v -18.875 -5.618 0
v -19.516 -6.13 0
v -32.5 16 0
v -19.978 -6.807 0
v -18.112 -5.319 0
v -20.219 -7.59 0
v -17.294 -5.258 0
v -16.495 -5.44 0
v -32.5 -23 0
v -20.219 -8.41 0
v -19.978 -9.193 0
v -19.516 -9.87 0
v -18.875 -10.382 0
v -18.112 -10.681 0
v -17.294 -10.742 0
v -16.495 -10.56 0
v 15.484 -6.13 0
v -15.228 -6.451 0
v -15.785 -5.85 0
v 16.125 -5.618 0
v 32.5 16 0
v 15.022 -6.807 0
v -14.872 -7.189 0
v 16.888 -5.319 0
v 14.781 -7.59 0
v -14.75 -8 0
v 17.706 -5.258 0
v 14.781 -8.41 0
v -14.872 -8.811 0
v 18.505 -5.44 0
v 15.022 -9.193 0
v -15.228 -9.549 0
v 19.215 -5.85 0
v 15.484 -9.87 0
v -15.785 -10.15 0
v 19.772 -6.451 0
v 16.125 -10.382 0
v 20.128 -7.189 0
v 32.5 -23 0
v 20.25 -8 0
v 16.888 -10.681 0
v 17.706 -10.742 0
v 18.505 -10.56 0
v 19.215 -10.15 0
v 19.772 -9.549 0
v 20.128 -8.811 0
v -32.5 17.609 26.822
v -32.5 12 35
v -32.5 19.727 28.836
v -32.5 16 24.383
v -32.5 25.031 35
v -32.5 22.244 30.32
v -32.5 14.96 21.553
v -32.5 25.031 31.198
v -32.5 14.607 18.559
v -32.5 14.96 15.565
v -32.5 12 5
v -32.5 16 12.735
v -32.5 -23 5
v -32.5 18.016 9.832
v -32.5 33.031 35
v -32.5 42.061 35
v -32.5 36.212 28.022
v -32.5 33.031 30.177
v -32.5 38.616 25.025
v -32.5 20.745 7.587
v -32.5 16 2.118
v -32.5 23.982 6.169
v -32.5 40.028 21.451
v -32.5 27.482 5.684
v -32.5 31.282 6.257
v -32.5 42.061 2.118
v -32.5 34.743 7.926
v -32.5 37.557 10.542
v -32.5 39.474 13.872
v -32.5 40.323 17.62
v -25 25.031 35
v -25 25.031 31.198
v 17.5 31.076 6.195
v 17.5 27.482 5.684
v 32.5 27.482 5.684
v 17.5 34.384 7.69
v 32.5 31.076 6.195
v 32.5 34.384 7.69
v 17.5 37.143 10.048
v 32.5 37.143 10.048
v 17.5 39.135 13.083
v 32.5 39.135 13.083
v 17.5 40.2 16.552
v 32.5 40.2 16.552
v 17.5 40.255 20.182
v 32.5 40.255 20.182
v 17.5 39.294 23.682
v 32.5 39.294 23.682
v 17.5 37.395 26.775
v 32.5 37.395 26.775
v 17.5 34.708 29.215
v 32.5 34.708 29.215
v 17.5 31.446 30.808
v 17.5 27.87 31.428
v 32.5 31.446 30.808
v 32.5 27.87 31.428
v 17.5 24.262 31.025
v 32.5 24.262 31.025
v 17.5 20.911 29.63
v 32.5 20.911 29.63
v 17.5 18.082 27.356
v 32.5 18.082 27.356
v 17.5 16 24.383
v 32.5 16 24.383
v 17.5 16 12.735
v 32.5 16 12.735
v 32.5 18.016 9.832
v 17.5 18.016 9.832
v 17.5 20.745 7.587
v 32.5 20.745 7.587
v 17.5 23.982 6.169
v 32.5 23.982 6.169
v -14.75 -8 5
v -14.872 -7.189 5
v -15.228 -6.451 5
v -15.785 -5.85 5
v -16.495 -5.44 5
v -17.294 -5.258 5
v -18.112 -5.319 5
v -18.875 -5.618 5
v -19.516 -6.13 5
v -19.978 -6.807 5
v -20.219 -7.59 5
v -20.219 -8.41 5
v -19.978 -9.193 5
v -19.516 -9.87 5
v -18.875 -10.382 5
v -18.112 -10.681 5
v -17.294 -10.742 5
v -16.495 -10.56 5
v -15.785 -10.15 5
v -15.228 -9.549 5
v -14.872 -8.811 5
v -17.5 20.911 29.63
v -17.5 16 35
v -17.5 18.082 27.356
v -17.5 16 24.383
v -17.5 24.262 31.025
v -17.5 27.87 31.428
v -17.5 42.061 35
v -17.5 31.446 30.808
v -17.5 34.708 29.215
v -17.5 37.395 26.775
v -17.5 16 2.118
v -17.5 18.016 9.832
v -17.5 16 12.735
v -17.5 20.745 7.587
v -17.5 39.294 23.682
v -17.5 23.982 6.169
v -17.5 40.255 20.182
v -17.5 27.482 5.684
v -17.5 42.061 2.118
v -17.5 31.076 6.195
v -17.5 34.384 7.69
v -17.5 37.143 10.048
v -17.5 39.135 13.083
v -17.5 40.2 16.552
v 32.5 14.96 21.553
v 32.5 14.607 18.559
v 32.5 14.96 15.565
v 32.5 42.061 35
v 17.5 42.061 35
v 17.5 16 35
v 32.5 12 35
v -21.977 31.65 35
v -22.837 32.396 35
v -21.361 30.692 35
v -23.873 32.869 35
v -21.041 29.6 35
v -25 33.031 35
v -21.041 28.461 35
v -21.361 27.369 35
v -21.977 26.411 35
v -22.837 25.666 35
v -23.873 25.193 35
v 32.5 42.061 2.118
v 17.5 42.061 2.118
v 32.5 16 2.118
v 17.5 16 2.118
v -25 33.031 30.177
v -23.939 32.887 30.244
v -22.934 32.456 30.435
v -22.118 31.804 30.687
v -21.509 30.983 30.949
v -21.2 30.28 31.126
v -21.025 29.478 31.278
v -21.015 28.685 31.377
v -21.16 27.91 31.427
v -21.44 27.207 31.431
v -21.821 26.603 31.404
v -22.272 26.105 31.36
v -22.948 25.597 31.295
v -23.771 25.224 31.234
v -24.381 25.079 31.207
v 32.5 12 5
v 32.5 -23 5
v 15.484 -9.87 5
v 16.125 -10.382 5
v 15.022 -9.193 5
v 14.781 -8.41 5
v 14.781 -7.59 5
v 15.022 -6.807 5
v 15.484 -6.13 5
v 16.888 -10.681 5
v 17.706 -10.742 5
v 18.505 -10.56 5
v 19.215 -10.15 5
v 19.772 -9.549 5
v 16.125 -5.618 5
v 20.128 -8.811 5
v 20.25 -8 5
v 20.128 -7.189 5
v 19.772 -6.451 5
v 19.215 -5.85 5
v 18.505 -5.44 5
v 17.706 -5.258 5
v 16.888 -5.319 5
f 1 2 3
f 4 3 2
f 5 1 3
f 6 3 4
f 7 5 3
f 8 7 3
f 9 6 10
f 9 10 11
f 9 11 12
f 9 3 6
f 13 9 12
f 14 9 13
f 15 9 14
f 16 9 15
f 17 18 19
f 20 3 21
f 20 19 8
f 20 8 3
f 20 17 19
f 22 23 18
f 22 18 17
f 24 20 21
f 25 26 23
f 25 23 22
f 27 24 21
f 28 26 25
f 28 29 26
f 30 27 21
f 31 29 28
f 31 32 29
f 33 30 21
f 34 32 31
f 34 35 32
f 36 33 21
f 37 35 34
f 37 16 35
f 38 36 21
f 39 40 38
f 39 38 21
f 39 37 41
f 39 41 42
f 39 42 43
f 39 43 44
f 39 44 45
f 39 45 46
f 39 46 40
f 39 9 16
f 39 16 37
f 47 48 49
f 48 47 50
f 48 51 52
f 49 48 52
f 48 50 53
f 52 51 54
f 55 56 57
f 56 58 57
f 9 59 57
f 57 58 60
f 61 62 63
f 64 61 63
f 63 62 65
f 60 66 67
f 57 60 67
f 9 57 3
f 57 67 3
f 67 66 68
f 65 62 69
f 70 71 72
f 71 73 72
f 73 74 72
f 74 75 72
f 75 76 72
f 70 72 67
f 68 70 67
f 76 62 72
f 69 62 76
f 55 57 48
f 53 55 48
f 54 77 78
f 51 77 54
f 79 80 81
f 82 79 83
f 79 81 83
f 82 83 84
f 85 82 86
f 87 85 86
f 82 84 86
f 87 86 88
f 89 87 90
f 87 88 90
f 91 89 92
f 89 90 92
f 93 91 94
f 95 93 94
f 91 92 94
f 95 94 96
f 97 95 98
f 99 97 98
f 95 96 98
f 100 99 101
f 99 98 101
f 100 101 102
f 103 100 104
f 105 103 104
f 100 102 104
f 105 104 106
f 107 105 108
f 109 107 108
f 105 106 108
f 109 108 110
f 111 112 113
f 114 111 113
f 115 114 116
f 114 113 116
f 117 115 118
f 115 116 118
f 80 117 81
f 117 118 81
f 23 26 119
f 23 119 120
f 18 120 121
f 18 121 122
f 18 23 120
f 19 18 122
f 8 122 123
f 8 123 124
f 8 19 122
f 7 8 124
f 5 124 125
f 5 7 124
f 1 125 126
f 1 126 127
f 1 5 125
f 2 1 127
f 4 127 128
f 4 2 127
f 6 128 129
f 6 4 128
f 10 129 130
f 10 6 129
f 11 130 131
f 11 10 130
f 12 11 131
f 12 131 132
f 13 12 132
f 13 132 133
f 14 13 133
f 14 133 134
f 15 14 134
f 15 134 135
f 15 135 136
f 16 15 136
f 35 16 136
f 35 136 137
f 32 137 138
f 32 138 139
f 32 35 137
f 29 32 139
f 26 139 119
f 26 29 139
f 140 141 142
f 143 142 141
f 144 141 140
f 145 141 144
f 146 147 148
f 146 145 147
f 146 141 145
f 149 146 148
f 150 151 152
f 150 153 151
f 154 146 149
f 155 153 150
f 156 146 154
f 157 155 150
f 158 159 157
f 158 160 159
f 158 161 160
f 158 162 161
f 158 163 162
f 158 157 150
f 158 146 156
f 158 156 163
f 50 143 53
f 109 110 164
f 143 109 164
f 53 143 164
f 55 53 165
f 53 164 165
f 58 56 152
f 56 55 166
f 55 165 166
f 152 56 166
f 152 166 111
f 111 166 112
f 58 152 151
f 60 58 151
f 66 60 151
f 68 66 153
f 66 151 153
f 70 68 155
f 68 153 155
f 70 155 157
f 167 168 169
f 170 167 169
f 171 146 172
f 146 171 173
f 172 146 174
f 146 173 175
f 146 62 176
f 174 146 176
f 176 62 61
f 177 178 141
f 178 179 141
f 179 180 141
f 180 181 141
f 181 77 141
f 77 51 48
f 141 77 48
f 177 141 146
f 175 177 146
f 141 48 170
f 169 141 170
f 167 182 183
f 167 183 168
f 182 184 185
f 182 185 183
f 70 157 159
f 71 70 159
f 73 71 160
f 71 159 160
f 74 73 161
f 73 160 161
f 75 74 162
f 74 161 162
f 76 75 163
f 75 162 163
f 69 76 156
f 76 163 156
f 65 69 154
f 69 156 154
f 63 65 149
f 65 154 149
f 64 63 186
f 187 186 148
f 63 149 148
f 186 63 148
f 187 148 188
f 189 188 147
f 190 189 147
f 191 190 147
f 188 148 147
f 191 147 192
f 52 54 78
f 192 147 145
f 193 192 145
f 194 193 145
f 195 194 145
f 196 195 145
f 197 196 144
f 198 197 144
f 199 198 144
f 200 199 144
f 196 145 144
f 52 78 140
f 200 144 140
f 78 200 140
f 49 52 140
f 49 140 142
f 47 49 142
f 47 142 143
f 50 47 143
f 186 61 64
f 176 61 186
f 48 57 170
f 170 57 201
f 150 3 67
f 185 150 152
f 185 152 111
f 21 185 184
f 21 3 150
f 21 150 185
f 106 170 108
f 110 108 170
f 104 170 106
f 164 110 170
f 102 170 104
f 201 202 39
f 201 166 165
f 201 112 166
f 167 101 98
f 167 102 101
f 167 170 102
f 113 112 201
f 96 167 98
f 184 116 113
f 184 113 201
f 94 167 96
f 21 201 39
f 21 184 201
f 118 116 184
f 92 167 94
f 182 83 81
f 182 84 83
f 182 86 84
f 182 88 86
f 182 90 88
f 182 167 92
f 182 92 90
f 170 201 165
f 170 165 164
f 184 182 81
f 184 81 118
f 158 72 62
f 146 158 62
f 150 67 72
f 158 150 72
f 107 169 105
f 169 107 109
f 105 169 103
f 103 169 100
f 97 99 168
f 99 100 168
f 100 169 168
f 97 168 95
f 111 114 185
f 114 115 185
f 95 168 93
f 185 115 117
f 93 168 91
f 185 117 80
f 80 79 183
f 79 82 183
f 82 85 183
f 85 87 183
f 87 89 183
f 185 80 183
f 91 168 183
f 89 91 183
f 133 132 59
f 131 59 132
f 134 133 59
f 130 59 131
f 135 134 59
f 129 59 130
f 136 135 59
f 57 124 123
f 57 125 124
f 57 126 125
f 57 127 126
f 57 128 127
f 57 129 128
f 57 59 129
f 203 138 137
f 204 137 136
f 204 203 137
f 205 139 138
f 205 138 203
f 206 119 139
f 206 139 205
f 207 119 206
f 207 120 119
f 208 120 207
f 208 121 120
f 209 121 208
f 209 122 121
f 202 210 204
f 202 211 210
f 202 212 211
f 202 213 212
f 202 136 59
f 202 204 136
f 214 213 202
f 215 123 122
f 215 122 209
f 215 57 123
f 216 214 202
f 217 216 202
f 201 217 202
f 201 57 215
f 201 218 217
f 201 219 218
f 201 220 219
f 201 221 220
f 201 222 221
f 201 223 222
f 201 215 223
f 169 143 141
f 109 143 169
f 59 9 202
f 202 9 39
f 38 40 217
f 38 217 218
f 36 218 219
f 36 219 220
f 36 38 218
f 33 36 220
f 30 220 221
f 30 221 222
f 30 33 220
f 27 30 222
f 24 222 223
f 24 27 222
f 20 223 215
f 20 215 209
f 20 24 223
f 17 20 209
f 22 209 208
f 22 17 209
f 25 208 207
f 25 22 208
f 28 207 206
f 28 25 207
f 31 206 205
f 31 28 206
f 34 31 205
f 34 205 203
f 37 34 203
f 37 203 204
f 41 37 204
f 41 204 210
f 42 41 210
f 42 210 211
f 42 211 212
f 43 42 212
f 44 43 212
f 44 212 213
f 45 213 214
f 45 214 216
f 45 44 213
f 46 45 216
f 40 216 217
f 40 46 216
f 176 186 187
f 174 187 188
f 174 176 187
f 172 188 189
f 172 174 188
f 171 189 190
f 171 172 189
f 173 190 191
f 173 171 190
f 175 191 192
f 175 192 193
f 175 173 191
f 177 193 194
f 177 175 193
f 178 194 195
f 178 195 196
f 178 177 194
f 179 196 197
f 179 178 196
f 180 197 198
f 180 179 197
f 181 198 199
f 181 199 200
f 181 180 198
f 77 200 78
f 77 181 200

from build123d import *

# Parameters (mm, degrees)
CROQUIS2_W              = 65
CROQUIS2_H              = 35
CROQUIS2_R              = 2.75
SALIENTE_EXTRUIR1_DEPTH = 5
CROQUIS3_W              = 65
CROQUIS3_H              = 35
SALIENTE_EXTRUIR2_DEPTH = 4
SALIENTE_EXTRUIR3_DEPTH = 15
SALIENTE_EXTRUIR4_START = -65
SALIENTE_EXTRUIR4_DEPTH = 15
CORTAR_EXTRUIR1_DEPTH   = 85.965620518
CORTAR_EXTRUIR2_START   = -32.882450487
CORTAR_EXTRUIR2_DEPTH   = 4.823037372


# Read off the part's stored shape, not the designer's step: Cortar-Extruir2
with BuildPart() as part:
    # Croquis2 → Saliente-Extruir1 (new body)
    with BuildSketch(Plane.XY):
        with Locations((0, -5.5)):
            Rectangle(CROQUIS2_W, CROQUIS2_H)
        with Locations((17.5, -8)):
            Circle(CROQUIS2_R, mode=Mode.SUBTRACT)
        with Locations((-17.5, -8)):
            Circle(CROQUIS2_R, mode=Mode.SUBTRACT)
    extrude(amount=SALIENTE_EXTRUIR1_DEPTH)

    # Croquis3 → Saliente-Extruir2 (add)
    with BuildSketch(Plane(origin=(0, 12, 0), x_dir=(1, 0, 0), z_dir=(0, 1, 0))):
        with Locations((0, -17.5)):
            Rectangle(CROQUIS3_W, CROQUIS3_H)
    extrude(amount=SALIENTE_EXTRUIR2_DEPTH)

    # Croquis4 → Saliente-Extruir3 (add)
    with BuildSketch(Plane(origin=(32.5, 0, 0), x_dir=(0, 0, -1), z_dir=(1, 0, 0))):
        with BuildLine():
            Line((-35, 42.06134413), (-35, 16))
            Line((-35, 16), (-24.382874813, 16))
            ThreePointArc((-24.382874813, 16), (-25.295997358, 38.453973796), (-5.683774756, 27.482398858))
            ThreePointArc((-5.683774756, 27.482398858), (-7.587199819, 20.745176256), (-12.7346747, 16))
            Line((-12.7346747, 16), (-2.117549513, 16))
            Line((-2.117549513, 16), (-2.117549513, 42.06134413))
            Line((-2.117549513, 42.06134413), (-35, 42.06134413))
        make_face()
        with BuildLine():
            Line((-12.7346747, 16), (-24.382874813, 16))
            ThreePointArc((-24.382874813, 16), (-18.558774756, 14.607398858), (-12.7346747, 16))
        make_face()
        with BuildLine():
            ThreePointArc((-5.683774756, 27.482398858), (-25.295997358, 38.453973796), (-24.382874813, 16))
            Line((-24.382874813, 16), (-12.7346747, 16))
            ThreePointArc((-12.7346747, 16), (-7.587199819, 20.745176256), (-5.683774756, 27.482398858))
        make_face()
    extrude(amount=-SALIENTE_EXTRUIR3_DEPTH)

    # Croquis4<6> → Saliente-Extruir4 (add)
    with BuildSketch(Plane(origin=(32.5, 0, 0), x_dir=(0, 0, -1), z_dir=(1, 0, 0)).offset(SALIENTE_EXTRUIR4_START)):
        with BuildLine():
            Line((-35, 42.06134413), (-35, 16))
            Line((-35, 16), (-24.382874813, 16))
            ThreePointArc((-24.382874813, 16), (-25.295997358, 38.453973796), (-5.683774756, 27.482398858))
            ThreePointArc((-5.683774756, 27.482398858), (-7.587199819, 20.745176256), (-12.7346747, 16))
            Line((-12.7346747, 16), (-2.117549513, 16))
            Line((-2.117549513, 16), (-2.117549513, 42.06134413))
            Line((-2.117549513, 42.06134413), (-35, 42.06134413))
        make_face()
        with BuildLine():
            Line((-12.7346747, 16), (-24.382874813, 16))
            ThreePointArc((-24.382874813, 16), (-18.558774756, 14.607398858), (-12.7346747, 16))
        make_face()
        with BuildLine():
            ThreePointArc((-5.683774756, 27.482398858), (-25.295997358, 38.453973796), (-24.382874813, 16))
            Line((-24.382874813, 16), (-12.7346747, 16))
            ThreePointArc((-12.7346747, 16), (-7.587199819, 20.745176256), (-5.683774756, 27.482398858))
        make_face()
    extrude(amount=SALIENTE_EXTRUIR4_DEPTH)

    # Croquis4<4> → Cortar-Extruir1 (cut, through all)
    with BuildSketch(Plane(origin=(32.5, 0, 0), x_dir=(0, 0, -1), z_dir=(1, 0, 0))):
        with BuildLine():
            Line((-12.7346747, 16), (-24.382874813, 16))
            ThreePointArc((-24.382874813, 16), (-18.558774756, 14.607398858), (-12.7346747, 16))
        make_face()
        with BuildLine():
            ThreePointArc((-5.683774756, 27.482398858), (-25.295997358, 38.453973796), (-24.382874813, 16))
            Line((-24.382874813, 16), (-12.7346747, 16))
            ThreePointArc((-12.7346747, 16), (-7.587199819, 20.745176256), (-5.683774756, 27.482398858))
        make_face()
    extrude(amount=-CORTAR_EXTRUIR1_DEPTH, mode=Mode.SUBTRACT)

    # Cortar-Extruir2 outline → Cortar-Extruir2 (cut)
    with BuildSketch(Plane(origin=(0, 0, 2.117549513), x_dir=(-1, 0, 0), z_dir=(0, 0, -1)).offset(CORTAR_EXTRUIR2_START)):
        with BuildLine():
            Line((32.5, 33.030672065), (25, 33.030672065))
            ThreePointArc((25, 33.030672065), (21, 29.030672065), (25, 25.030672065))
            Line((25, 25.030672065), (32.5, 25.030672065))
            Line((32.5, 25.030672065), (32.5, 33.030672065))
        make_face()
    extrude(amount=CORTAR_EXTRUIR2_DEPTH, mode=Mode.SUBTRACT)


solid = part.part
